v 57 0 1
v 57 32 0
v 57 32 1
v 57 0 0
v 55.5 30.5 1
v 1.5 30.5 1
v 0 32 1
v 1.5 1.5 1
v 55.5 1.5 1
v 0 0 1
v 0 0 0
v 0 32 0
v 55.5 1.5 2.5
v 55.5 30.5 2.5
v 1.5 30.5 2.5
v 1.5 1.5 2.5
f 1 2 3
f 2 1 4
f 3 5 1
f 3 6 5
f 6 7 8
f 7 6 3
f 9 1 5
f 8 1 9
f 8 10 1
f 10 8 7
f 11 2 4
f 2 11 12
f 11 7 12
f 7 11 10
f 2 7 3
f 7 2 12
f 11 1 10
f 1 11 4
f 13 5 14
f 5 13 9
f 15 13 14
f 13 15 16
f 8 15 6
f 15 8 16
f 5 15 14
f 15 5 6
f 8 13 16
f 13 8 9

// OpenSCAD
// file: detail/config.scad
eps = 0.01;
int_size = [55, 30, 20];
wall = 1;
ext_size = int_size + wall * [2,2,2];
// main file
include <detail/config.scad>


module top()
{
  w = wall + 0.5;
  cube([ext_size[0], ext_size[1], wall]);
  translate(w*[1,1,0])
    cube([ext_size[0]-2*w, ext_size[1]-2*w, wall+w]);
}

top();
